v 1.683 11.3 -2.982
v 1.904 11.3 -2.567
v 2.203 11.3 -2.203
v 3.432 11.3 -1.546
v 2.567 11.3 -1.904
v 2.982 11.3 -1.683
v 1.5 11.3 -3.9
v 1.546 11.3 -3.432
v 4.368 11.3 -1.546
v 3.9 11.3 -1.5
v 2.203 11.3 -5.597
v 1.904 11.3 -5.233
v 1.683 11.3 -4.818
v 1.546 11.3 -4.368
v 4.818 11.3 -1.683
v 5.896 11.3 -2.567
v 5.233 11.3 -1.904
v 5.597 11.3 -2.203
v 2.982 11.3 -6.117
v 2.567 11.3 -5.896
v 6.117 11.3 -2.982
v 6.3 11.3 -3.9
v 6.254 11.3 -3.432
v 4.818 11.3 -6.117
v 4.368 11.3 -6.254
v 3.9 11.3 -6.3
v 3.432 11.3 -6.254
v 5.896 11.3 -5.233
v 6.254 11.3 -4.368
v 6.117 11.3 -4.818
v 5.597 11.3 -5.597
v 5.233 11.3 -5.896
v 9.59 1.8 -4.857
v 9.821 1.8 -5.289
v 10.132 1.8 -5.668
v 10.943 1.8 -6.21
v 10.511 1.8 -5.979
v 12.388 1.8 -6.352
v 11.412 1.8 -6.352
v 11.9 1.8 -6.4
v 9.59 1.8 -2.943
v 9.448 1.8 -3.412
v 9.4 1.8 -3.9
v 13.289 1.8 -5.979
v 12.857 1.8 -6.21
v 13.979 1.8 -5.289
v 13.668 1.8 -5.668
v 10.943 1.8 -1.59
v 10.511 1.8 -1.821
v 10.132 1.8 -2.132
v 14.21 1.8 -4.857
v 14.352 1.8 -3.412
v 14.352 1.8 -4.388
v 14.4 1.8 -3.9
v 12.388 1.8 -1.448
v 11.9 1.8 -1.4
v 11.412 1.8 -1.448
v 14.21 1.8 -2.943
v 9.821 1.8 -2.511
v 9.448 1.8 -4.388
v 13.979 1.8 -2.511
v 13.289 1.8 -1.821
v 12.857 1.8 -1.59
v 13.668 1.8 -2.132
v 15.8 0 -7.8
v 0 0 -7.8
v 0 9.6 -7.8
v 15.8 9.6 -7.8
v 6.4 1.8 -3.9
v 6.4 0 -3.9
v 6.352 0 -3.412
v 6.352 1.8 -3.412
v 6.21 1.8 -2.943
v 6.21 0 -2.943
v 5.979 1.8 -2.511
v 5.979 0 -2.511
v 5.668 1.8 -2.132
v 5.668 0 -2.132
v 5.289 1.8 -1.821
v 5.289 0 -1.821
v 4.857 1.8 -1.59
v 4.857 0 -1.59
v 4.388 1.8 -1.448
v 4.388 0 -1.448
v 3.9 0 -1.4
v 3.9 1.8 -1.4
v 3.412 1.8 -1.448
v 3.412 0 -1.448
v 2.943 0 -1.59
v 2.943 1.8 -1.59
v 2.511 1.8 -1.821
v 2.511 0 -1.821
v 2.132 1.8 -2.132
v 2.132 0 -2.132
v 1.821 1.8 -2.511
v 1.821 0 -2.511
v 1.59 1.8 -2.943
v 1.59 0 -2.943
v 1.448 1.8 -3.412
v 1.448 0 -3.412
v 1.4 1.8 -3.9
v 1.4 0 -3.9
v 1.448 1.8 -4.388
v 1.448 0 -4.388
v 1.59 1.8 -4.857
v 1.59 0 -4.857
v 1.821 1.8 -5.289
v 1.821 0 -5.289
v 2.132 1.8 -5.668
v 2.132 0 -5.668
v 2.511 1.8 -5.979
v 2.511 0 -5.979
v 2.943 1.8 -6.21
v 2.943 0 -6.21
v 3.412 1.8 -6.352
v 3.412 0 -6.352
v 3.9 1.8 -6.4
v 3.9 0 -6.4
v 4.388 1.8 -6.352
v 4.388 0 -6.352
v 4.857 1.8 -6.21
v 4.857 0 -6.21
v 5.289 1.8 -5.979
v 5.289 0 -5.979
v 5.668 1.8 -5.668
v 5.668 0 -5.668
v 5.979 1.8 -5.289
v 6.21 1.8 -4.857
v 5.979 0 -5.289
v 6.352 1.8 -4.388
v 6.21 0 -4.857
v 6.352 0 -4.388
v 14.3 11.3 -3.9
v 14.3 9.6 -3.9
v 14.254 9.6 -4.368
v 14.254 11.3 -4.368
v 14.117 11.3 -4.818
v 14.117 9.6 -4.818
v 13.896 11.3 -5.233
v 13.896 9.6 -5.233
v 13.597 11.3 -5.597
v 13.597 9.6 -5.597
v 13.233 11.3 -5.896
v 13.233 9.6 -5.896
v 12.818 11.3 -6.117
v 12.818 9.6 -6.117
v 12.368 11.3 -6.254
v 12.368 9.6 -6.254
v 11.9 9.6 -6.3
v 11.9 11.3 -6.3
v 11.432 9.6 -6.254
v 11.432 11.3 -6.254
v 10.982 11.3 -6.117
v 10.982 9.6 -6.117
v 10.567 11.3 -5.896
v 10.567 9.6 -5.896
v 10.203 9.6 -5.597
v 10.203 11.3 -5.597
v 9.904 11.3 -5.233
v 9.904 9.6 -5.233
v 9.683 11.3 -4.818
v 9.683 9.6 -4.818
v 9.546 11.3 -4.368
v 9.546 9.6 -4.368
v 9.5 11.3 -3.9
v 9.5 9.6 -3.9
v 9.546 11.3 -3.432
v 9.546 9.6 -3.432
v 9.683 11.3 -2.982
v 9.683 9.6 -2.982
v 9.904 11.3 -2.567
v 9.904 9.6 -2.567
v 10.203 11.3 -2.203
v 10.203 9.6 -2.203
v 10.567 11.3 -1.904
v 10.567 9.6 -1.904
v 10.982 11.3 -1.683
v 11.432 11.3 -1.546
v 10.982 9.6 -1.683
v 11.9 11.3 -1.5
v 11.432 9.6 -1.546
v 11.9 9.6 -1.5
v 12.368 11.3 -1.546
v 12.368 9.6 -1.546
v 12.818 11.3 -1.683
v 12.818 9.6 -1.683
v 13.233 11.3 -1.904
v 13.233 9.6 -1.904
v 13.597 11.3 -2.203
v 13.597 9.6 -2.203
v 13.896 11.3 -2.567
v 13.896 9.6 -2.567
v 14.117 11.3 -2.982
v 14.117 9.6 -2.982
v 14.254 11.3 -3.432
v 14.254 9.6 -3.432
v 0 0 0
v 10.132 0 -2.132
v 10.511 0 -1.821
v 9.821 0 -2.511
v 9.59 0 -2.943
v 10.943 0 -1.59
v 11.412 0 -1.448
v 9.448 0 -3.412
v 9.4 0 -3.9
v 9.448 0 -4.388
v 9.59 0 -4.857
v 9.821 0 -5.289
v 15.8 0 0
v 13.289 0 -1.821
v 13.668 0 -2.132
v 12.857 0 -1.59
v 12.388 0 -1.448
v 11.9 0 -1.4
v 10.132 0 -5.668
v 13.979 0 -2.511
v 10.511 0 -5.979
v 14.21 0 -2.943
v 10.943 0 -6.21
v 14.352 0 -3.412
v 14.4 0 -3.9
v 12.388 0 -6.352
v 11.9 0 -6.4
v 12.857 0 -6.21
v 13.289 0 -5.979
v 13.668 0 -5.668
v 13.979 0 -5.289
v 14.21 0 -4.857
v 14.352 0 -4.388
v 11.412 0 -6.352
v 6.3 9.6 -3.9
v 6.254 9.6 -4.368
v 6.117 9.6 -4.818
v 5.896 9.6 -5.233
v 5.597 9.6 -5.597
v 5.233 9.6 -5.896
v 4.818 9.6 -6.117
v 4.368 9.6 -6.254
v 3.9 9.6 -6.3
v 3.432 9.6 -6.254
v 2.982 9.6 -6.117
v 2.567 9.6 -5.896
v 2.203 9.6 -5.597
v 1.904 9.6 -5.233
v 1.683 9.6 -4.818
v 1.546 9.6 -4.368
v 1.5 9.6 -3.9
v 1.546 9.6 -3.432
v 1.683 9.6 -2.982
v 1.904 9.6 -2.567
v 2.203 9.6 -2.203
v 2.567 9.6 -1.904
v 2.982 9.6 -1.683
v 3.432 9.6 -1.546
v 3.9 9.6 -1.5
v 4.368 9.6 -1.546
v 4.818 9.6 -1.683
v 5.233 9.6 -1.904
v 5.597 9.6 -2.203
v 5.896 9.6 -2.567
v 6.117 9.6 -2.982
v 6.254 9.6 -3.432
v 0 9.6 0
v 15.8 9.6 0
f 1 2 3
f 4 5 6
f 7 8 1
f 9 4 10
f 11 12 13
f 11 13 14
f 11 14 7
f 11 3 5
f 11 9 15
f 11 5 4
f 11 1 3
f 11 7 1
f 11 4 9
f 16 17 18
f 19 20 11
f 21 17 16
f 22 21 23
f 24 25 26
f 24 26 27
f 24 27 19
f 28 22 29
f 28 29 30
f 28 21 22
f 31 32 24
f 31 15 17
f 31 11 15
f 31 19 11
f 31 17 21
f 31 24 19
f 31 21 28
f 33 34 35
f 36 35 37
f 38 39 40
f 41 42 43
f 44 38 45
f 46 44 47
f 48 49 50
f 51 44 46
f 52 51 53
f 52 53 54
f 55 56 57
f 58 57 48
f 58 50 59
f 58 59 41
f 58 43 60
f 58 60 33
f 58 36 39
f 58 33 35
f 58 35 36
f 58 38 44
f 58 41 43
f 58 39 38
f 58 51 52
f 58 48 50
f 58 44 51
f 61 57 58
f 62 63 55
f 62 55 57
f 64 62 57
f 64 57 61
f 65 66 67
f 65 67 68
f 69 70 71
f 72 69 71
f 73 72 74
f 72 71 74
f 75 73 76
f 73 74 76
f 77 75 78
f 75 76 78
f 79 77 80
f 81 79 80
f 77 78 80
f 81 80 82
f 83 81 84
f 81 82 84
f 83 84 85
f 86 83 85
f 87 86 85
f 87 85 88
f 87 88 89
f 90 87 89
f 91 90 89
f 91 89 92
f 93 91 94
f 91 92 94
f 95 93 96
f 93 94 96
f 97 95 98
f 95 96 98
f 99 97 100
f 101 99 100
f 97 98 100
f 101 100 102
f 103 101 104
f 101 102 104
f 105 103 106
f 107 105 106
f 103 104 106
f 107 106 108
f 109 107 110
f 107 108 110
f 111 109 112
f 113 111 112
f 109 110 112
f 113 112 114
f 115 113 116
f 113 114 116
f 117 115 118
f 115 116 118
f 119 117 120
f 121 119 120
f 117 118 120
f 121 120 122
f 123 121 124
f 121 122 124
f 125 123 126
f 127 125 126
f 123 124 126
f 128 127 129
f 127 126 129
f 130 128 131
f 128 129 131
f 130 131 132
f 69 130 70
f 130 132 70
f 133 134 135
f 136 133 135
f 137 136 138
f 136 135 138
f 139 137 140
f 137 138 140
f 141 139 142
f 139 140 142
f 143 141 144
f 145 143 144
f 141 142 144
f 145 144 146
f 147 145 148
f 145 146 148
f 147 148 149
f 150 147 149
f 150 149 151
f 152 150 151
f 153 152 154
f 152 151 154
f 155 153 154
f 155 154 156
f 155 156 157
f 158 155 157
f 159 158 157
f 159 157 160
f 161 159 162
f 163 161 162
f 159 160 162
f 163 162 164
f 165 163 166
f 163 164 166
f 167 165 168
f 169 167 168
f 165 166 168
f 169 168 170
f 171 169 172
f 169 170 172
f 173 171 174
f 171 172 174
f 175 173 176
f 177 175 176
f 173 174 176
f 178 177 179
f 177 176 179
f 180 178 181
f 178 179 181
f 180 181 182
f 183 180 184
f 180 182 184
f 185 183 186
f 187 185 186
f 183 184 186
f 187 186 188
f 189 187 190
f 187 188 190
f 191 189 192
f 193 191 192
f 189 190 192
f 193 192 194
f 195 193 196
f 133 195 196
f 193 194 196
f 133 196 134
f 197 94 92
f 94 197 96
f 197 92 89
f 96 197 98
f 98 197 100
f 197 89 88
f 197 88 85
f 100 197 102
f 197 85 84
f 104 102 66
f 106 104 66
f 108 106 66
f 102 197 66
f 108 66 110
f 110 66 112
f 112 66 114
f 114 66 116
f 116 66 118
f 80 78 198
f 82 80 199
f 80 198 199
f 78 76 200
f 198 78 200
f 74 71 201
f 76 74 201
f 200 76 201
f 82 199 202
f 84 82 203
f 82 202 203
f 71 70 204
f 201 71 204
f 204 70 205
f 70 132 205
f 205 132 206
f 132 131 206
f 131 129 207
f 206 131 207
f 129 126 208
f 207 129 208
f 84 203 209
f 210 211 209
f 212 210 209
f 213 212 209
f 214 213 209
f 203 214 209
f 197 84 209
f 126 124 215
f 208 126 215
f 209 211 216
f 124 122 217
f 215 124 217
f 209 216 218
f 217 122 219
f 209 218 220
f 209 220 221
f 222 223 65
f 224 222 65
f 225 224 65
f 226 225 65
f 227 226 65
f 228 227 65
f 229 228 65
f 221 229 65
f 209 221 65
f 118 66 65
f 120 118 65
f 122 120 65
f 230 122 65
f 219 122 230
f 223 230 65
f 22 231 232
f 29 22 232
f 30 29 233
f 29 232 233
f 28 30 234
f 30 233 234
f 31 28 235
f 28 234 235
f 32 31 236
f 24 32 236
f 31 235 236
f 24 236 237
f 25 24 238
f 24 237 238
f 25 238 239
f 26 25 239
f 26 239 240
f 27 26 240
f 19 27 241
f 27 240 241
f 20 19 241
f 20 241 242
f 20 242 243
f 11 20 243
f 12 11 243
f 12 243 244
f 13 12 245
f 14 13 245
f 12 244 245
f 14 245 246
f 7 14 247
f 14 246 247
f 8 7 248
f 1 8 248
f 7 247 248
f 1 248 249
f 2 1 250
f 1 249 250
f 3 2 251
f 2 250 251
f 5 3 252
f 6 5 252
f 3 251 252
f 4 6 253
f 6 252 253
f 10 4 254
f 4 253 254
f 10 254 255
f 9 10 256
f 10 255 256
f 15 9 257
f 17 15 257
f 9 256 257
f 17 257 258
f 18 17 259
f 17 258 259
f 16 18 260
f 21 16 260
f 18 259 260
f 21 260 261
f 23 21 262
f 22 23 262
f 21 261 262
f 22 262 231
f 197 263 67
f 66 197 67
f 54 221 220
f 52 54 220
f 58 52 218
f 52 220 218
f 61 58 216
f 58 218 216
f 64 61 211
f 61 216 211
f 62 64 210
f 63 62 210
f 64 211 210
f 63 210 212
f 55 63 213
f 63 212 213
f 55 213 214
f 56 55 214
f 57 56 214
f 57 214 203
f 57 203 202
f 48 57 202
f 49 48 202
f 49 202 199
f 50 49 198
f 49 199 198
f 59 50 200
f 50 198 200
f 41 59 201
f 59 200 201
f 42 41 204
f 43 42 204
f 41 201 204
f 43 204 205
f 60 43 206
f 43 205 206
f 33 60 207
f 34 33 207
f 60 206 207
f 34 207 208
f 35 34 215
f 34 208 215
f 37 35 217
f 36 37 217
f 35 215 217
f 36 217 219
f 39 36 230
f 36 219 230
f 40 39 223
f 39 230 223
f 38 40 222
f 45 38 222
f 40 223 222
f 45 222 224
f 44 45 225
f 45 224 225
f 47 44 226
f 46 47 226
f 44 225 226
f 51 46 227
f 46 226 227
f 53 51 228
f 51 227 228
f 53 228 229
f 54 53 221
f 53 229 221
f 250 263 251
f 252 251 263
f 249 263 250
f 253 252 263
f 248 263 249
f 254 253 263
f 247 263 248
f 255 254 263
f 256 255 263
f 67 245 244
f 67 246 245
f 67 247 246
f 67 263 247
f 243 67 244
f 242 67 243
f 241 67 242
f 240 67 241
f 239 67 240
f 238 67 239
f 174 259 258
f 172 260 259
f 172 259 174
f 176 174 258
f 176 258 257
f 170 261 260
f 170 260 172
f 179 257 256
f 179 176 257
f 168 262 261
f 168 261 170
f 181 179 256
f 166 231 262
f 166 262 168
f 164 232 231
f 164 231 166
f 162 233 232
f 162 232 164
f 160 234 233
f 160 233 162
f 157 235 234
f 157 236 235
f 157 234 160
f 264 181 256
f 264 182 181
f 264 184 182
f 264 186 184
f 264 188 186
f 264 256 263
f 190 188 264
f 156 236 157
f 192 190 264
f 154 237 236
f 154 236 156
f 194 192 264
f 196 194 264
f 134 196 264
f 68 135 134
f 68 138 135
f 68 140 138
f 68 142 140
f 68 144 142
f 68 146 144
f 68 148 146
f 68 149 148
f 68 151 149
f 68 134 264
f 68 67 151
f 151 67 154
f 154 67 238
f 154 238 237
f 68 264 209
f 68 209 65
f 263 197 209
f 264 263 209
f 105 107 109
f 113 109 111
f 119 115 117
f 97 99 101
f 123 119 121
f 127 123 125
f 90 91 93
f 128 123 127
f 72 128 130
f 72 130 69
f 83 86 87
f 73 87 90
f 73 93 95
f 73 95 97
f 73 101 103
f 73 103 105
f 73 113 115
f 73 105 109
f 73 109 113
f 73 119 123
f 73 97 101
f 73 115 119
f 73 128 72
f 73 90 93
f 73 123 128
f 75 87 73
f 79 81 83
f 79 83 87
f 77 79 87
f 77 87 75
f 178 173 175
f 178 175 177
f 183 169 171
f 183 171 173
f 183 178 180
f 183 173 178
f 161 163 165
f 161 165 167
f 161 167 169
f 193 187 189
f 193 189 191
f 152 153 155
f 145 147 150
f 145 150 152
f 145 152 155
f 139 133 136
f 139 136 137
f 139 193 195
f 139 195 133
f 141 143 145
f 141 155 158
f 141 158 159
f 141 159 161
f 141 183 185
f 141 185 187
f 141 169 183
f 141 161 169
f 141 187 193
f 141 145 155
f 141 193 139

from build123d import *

# Parameters (mm, degrees)
SKETCH_1_W          = 15.8
SKETCH_1_H          = 7.8
EXTRUDE_1_DEPTH     = 9.6
SKETCH_2_R          = 2.4
EXTRUDE_2_DEPTH     = 1.7
SKETCH_3_R          = 2.5
CUT_EXTRUDE_1_DEPTH = 1.8


with BuildPart() as part:
    # Эскиз1 → Бобышка-Вытянуть1 (new body)
    with BuildSketch(Plane(origin=(0, 0, 0), x_dir=(1, 0, 0), z_dir=(0, 1, 0))):
        with Locations((7.9, 3.9)):
            Rectangle(SKETCH_1_W, SKETCH_1_H)
    extrude(amount=EXTRUDE_1_DEPTH)

    # Эскиз2 → Бобышка-Вытянуть2 (add)
    with BuildSketch(Plane(origin=(0, 9.6, 0), x_dir=(1, 0, 0), z_dir=(0, 1, 0))):
        with Locations((3.9, 3.9)):
            Circle(SKETCH_2_R)
        with Locations((11.9, 3.9)):
            Circle(SKETCH_2_R)
    extrude(amount=EXTRUDE_2_DEPTH)

    # Эскиз3 → Вырез-Вытянуть1 (cut)
    with BuildSketch(Plane.XZ):
        with Locations((11.9, -3.9)):
            Circle(SKETCH_3_R)
        with Locations((3.9, -3.9)):
            Circle(SKETCH_3_R)
    extrude(amount=-CUT_EXTRUDE_1_DEPTH, mode=Mode.SUBTRACT)


solid = part.part
